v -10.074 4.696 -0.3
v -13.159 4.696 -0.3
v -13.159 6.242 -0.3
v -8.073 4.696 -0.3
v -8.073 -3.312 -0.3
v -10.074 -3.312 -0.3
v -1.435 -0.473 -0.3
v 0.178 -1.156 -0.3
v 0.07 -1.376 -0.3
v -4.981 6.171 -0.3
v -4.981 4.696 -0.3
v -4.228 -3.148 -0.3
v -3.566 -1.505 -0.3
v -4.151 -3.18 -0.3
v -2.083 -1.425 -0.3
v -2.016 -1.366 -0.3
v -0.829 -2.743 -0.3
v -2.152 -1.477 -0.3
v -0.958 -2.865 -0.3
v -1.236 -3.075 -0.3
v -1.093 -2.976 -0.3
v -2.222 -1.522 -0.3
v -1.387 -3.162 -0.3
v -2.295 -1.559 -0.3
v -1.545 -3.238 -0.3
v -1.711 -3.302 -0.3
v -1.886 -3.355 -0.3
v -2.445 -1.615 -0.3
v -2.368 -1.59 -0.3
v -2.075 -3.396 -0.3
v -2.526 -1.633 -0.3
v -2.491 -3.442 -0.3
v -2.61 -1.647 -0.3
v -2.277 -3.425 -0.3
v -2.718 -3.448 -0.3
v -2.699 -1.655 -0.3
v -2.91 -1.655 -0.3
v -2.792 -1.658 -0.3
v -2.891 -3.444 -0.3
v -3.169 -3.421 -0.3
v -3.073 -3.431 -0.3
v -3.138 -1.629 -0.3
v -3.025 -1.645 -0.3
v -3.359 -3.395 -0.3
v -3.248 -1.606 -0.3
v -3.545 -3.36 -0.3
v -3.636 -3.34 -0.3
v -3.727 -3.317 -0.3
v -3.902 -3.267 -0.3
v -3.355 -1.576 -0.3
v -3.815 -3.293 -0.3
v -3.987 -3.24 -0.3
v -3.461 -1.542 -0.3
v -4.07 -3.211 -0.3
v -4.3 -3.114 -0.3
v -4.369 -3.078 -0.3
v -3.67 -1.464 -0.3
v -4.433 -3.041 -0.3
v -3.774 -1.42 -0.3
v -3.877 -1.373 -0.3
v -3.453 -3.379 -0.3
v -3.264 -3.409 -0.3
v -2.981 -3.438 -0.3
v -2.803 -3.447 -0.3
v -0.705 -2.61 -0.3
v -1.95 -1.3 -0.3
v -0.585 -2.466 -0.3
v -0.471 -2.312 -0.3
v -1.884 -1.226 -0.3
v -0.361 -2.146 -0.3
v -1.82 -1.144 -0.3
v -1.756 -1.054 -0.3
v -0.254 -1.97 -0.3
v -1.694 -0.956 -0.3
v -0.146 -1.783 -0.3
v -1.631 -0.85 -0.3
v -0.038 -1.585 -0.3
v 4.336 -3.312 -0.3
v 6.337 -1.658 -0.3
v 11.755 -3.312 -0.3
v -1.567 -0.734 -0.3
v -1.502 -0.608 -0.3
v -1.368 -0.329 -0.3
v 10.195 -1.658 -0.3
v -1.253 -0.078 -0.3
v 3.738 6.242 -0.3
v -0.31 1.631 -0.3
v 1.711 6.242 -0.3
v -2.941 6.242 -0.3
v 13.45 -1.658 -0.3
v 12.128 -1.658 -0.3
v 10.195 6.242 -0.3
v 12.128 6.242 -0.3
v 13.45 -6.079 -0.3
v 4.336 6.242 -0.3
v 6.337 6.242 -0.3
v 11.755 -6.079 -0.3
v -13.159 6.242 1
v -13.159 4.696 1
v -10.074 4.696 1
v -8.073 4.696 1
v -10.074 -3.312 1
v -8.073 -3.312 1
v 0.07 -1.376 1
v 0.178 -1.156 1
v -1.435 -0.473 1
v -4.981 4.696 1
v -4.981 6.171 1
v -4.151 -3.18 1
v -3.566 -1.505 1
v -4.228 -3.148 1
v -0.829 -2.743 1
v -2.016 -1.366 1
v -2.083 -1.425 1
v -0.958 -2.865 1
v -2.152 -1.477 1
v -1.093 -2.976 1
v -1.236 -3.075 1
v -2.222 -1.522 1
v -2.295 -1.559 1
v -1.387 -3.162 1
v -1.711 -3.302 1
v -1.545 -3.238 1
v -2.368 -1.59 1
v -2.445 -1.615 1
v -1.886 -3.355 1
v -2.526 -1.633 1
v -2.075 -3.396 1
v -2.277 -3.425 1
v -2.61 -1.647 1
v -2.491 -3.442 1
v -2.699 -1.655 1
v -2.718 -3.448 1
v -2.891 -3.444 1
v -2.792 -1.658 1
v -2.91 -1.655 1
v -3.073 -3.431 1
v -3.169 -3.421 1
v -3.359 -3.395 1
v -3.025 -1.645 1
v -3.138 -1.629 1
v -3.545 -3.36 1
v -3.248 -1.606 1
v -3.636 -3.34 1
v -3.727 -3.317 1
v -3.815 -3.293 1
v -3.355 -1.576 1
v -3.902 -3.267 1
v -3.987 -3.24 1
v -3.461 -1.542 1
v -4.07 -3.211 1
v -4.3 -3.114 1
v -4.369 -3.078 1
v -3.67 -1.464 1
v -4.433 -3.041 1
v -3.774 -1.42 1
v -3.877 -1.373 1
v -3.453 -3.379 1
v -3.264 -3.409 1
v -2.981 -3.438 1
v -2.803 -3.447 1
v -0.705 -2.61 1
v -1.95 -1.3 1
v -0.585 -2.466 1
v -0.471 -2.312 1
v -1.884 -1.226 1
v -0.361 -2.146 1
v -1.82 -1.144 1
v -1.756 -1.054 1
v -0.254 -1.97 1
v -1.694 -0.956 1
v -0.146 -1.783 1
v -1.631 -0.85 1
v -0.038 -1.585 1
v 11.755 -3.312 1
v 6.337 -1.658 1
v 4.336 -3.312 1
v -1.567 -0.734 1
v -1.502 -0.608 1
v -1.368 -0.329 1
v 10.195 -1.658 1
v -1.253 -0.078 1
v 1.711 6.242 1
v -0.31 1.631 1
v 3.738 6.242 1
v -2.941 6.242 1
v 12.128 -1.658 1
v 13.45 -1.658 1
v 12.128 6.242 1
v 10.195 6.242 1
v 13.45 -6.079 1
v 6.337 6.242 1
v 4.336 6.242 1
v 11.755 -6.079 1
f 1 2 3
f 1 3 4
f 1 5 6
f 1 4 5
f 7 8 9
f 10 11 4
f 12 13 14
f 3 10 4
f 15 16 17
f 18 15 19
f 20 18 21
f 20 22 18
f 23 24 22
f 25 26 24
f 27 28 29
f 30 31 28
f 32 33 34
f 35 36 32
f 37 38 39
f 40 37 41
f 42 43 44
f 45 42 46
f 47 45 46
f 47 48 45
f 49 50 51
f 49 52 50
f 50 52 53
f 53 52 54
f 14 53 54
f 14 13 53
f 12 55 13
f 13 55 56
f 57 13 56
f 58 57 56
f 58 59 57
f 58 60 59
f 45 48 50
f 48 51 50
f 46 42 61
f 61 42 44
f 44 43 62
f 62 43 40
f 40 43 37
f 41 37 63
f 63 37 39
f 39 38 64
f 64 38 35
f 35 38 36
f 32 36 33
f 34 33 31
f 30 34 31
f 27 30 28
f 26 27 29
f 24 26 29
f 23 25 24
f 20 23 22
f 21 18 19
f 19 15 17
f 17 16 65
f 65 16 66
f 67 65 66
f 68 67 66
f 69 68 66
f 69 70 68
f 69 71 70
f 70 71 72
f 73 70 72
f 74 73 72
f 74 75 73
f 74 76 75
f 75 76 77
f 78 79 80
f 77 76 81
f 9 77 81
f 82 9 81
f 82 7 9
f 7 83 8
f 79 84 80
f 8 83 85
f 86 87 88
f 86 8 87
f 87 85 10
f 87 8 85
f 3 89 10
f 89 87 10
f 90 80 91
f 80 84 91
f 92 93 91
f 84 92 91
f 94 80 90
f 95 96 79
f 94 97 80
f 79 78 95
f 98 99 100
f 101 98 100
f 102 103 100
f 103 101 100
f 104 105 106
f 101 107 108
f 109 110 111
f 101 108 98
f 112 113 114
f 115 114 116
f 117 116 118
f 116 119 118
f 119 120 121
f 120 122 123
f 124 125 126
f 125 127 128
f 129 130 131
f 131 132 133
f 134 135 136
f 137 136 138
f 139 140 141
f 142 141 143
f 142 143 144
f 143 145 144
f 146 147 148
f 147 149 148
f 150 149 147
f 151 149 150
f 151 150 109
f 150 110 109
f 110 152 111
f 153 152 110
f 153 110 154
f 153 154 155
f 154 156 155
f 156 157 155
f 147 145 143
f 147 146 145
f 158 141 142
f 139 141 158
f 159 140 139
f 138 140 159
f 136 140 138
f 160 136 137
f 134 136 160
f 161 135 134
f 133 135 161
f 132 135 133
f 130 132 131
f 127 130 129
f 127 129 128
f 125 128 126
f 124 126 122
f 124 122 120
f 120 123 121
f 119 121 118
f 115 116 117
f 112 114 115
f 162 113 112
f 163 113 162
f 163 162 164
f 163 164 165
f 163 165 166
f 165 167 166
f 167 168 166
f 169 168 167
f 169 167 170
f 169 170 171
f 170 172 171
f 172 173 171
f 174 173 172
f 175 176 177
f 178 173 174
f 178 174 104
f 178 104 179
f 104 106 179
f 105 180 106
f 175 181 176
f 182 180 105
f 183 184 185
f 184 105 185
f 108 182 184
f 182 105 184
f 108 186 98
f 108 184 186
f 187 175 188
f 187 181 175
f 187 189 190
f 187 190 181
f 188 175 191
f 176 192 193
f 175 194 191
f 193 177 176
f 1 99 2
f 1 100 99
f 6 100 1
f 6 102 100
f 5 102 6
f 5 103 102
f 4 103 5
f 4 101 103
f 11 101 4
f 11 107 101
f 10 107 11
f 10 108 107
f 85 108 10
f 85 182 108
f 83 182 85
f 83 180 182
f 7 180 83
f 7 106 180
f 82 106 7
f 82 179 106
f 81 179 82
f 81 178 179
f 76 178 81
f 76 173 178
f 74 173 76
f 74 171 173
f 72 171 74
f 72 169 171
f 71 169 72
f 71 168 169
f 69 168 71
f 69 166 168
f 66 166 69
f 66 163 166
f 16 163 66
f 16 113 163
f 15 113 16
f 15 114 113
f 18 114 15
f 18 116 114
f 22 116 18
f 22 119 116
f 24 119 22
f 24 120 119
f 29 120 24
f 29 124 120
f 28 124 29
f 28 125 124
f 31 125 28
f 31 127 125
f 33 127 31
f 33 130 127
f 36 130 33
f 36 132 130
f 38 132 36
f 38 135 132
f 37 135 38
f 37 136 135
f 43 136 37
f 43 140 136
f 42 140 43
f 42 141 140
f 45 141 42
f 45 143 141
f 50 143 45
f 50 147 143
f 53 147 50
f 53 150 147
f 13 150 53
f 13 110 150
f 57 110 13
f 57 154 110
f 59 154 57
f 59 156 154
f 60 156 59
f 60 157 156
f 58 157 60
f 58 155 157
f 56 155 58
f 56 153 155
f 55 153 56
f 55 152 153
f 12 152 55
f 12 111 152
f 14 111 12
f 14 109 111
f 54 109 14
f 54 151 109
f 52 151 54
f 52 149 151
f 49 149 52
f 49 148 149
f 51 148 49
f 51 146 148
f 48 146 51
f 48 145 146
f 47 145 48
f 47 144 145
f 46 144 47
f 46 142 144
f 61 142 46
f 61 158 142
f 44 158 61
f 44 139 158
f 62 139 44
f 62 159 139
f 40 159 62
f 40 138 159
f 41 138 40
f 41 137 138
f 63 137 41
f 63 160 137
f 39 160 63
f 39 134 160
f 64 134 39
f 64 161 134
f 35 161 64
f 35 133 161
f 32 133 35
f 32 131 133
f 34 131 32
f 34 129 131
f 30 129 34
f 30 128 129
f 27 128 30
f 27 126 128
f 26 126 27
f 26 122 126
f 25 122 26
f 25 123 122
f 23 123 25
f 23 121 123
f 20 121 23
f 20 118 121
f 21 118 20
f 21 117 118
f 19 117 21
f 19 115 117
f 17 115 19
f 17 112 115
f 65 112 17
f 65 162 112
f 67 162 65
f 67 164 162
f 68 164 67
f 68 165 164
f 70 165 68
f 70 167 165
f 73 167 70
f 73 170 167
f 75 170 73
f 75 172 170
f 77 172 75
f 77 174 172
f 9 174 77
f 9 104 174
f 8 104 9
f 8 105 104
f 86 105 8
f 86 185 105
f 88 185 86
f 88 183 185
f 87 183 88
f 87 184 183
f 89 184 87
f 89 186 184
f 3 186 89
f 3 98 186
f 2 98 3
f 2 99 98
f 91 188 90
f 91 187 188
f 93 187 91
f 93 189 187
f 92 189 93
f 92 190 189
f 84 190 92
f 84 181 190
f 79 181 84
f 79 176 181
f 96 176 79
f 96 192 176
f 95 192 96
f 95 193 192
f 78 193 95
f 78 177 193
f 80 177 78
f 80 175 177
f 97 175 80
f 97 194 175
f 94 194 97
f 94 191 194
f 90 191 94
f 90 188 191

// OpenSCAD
// Надпись, логотип или текстура для тиснения на загруженной модели (B30, B68).
//
// Этот файл строит ТОЛЬКО само тиснение — плоскую фигуру (текст, SVG или участок
// повторяющегося узора), вытянутую
// в толщину. Фигура лежит в плоскости XY, центр — в начале координат, «лицом» вверх (+Z).
// Сервер (app/emboss.py) поворачивает её на нужную грань модели и соединяет с моделью:
// выпуклую — прибавляет, углублённую — вырезает. Параметры переопределяет сервер:
//     openscad -D kind="text" -D text="ТУЦ" -D size_mm=10 ... emboss.scad

kind = "text";          // "text" — надпись, "logo" — картинка из файла logo_file (SVG),
                        // "pattern" — текстура: узор pattern на квадрате со стороной size_mm (B68)
text = "ТУЦ";           // надпись
font = "sans";          // "sans" | "serif" | "mono"
bold = true;            // жирное начертание
size_mm = 10;           // текст: размер шрифта (высота заглавной буквы); логотип: ширина;
                        // текстура: сторона квадратного участка
depth_mm = 1;           // высота выпуклого / глубина углублённого тиснения
style = "raised";       // "raised" — выпуклое, "engraved" — углублённое
logo_file = "";         // путь к SVG, когда kind = "logo"
angle = 0;              // поворот фигуры в её плоскости, градусы (против часовой стрелки)
pattern = "lines";      // текстура: "lines" — полосы, "grid" — сетка, "dots" — точки, "hex" — соты
pitch_mm = 3;           // текстура: шаг узора (расстояние между повторами), мм

// Запас, на который фигура заходит внутрь модели (выпуклая) или выступает над ней
// (углублённая): так тиснение точно сцепляется с поверхностью, даже если она не идеально
// ровная или сетка загружена с мелкой погрешностью. На изогнутой поверхности API передаёт
// -D overlap=<глубина надписи> (B64a), чтобы края букв не повисли в воздухе.
overlap = 0.3;

$fn = 32;

// Шрифты Liberation стоят в worker (fonts-liberation) — в них есть кириллица.
family = font == "serif" ? "Liberation Serif" : font == "mono" ? "Liberation Mono" : "Liberation Sans";
font_spec = str(family, ":style=", bold ? "Bold" : "Regular");

// --- текстура (B68) ------------------------------------------------------------------
// Узор — бесконечно повторяющаяся плоская фигура, заполняющая примерно половину площади:
// полосы и прутья сетки шириной в половину шага, точки и соты — тоже около половины.
// Так выпуклая и врезанная версии одного узора выглядят одинаково «плотно», а печатаются
// без тонких элементов: при шаге 2 мм прут 1 мм — это 2–3 линии сопла 0,4 мм.
// Участок — квадрат size_mm, узор обрезается по нему (intersection), края ровные.
half = size_mm / 2;
n = ceil(half / pitch_mm) + 1;            // сколько повторов нужно от центра до края

module stripes() {                        // полосы вдоль Y с шагом pitch_mm
    for (i = [-n : n])
        translate([i * pitch_mm - pitch_mm / 4, -half - pitch_mm, 0])
            square([pitch_mm / 2, size_mm + 2 * pitch_mm]);
}

module pattern2d() {
    if (pattern == "lines") {
        stripes();
    } else if (pattern == "grid") {
        stripes();
        rotate([0, 0, 90]) stripes();
    } else if (pattern == "dots") {
        // Точки диаметром 0,75 шага на квадратной решётке
        for (i = [-n : n], j = [-n : n])
            translate([i * pitch_mm, j * pitch_mm, 0]) circle(d = pitch_mm * 0.75, $fn = 24);
    } else if (pattern == "hex") {
        // Соты: шестиугольники на треугольной решётке (соседи в ряду — на расстоянии
        // шага, ряды через шаг·√3/2, нечётные сдвинуты на полшага), зазор между сотами —
        // четверть шага. Поворот на 30° ставит соты плоской стороной к соседу по ряду.
        row_h = pitch_mm * sqrt(3) / 2;
        rows = ceil(half / row_h) + 1;
        for (j = [-rows : rows], i = [-n - 1 : n + 1])
            translate([i * pitch_mm + (j % 2 == 0 ? 0 : pitch_mm / 2), j * row_h, 0])
                rotate([0, 0, 30]) circle(d = pitch_mm * 0.75 / cos(30), $fn = 6);
    }
}

module shape2d() {
    if (kind == "pattern") {
        intersection() {
            square(size_mm, center = true);
            pattern2d();
        }
    } else if (kind == "logo") {
        // SVG приводим к ширине size_mm, пропорции сохраняем (auto=true).
        resize([size_mm, 0], auto = true) import(logo_file, center = true);
    } else {
        text(text, size = size_mm, font = font_spec, halign = "center", valign = "center");
    }
}

// Выпуклое: от -overlap (внутри модели) до +depth_mm над поверхностью.
// Углублённое: от -depth_mm (в глубину) до +overlap (чуть выше поверхности, чтобы вырез
// наверняка прошёл сквозь грань).
z0 = style == "engraved" ? -depth_mm : -overlap;
translate([0, 0, z0])
    linear_extrude(height = depth_mm + overlap)
        rotate([0, 0, angle])
            shape2d();
